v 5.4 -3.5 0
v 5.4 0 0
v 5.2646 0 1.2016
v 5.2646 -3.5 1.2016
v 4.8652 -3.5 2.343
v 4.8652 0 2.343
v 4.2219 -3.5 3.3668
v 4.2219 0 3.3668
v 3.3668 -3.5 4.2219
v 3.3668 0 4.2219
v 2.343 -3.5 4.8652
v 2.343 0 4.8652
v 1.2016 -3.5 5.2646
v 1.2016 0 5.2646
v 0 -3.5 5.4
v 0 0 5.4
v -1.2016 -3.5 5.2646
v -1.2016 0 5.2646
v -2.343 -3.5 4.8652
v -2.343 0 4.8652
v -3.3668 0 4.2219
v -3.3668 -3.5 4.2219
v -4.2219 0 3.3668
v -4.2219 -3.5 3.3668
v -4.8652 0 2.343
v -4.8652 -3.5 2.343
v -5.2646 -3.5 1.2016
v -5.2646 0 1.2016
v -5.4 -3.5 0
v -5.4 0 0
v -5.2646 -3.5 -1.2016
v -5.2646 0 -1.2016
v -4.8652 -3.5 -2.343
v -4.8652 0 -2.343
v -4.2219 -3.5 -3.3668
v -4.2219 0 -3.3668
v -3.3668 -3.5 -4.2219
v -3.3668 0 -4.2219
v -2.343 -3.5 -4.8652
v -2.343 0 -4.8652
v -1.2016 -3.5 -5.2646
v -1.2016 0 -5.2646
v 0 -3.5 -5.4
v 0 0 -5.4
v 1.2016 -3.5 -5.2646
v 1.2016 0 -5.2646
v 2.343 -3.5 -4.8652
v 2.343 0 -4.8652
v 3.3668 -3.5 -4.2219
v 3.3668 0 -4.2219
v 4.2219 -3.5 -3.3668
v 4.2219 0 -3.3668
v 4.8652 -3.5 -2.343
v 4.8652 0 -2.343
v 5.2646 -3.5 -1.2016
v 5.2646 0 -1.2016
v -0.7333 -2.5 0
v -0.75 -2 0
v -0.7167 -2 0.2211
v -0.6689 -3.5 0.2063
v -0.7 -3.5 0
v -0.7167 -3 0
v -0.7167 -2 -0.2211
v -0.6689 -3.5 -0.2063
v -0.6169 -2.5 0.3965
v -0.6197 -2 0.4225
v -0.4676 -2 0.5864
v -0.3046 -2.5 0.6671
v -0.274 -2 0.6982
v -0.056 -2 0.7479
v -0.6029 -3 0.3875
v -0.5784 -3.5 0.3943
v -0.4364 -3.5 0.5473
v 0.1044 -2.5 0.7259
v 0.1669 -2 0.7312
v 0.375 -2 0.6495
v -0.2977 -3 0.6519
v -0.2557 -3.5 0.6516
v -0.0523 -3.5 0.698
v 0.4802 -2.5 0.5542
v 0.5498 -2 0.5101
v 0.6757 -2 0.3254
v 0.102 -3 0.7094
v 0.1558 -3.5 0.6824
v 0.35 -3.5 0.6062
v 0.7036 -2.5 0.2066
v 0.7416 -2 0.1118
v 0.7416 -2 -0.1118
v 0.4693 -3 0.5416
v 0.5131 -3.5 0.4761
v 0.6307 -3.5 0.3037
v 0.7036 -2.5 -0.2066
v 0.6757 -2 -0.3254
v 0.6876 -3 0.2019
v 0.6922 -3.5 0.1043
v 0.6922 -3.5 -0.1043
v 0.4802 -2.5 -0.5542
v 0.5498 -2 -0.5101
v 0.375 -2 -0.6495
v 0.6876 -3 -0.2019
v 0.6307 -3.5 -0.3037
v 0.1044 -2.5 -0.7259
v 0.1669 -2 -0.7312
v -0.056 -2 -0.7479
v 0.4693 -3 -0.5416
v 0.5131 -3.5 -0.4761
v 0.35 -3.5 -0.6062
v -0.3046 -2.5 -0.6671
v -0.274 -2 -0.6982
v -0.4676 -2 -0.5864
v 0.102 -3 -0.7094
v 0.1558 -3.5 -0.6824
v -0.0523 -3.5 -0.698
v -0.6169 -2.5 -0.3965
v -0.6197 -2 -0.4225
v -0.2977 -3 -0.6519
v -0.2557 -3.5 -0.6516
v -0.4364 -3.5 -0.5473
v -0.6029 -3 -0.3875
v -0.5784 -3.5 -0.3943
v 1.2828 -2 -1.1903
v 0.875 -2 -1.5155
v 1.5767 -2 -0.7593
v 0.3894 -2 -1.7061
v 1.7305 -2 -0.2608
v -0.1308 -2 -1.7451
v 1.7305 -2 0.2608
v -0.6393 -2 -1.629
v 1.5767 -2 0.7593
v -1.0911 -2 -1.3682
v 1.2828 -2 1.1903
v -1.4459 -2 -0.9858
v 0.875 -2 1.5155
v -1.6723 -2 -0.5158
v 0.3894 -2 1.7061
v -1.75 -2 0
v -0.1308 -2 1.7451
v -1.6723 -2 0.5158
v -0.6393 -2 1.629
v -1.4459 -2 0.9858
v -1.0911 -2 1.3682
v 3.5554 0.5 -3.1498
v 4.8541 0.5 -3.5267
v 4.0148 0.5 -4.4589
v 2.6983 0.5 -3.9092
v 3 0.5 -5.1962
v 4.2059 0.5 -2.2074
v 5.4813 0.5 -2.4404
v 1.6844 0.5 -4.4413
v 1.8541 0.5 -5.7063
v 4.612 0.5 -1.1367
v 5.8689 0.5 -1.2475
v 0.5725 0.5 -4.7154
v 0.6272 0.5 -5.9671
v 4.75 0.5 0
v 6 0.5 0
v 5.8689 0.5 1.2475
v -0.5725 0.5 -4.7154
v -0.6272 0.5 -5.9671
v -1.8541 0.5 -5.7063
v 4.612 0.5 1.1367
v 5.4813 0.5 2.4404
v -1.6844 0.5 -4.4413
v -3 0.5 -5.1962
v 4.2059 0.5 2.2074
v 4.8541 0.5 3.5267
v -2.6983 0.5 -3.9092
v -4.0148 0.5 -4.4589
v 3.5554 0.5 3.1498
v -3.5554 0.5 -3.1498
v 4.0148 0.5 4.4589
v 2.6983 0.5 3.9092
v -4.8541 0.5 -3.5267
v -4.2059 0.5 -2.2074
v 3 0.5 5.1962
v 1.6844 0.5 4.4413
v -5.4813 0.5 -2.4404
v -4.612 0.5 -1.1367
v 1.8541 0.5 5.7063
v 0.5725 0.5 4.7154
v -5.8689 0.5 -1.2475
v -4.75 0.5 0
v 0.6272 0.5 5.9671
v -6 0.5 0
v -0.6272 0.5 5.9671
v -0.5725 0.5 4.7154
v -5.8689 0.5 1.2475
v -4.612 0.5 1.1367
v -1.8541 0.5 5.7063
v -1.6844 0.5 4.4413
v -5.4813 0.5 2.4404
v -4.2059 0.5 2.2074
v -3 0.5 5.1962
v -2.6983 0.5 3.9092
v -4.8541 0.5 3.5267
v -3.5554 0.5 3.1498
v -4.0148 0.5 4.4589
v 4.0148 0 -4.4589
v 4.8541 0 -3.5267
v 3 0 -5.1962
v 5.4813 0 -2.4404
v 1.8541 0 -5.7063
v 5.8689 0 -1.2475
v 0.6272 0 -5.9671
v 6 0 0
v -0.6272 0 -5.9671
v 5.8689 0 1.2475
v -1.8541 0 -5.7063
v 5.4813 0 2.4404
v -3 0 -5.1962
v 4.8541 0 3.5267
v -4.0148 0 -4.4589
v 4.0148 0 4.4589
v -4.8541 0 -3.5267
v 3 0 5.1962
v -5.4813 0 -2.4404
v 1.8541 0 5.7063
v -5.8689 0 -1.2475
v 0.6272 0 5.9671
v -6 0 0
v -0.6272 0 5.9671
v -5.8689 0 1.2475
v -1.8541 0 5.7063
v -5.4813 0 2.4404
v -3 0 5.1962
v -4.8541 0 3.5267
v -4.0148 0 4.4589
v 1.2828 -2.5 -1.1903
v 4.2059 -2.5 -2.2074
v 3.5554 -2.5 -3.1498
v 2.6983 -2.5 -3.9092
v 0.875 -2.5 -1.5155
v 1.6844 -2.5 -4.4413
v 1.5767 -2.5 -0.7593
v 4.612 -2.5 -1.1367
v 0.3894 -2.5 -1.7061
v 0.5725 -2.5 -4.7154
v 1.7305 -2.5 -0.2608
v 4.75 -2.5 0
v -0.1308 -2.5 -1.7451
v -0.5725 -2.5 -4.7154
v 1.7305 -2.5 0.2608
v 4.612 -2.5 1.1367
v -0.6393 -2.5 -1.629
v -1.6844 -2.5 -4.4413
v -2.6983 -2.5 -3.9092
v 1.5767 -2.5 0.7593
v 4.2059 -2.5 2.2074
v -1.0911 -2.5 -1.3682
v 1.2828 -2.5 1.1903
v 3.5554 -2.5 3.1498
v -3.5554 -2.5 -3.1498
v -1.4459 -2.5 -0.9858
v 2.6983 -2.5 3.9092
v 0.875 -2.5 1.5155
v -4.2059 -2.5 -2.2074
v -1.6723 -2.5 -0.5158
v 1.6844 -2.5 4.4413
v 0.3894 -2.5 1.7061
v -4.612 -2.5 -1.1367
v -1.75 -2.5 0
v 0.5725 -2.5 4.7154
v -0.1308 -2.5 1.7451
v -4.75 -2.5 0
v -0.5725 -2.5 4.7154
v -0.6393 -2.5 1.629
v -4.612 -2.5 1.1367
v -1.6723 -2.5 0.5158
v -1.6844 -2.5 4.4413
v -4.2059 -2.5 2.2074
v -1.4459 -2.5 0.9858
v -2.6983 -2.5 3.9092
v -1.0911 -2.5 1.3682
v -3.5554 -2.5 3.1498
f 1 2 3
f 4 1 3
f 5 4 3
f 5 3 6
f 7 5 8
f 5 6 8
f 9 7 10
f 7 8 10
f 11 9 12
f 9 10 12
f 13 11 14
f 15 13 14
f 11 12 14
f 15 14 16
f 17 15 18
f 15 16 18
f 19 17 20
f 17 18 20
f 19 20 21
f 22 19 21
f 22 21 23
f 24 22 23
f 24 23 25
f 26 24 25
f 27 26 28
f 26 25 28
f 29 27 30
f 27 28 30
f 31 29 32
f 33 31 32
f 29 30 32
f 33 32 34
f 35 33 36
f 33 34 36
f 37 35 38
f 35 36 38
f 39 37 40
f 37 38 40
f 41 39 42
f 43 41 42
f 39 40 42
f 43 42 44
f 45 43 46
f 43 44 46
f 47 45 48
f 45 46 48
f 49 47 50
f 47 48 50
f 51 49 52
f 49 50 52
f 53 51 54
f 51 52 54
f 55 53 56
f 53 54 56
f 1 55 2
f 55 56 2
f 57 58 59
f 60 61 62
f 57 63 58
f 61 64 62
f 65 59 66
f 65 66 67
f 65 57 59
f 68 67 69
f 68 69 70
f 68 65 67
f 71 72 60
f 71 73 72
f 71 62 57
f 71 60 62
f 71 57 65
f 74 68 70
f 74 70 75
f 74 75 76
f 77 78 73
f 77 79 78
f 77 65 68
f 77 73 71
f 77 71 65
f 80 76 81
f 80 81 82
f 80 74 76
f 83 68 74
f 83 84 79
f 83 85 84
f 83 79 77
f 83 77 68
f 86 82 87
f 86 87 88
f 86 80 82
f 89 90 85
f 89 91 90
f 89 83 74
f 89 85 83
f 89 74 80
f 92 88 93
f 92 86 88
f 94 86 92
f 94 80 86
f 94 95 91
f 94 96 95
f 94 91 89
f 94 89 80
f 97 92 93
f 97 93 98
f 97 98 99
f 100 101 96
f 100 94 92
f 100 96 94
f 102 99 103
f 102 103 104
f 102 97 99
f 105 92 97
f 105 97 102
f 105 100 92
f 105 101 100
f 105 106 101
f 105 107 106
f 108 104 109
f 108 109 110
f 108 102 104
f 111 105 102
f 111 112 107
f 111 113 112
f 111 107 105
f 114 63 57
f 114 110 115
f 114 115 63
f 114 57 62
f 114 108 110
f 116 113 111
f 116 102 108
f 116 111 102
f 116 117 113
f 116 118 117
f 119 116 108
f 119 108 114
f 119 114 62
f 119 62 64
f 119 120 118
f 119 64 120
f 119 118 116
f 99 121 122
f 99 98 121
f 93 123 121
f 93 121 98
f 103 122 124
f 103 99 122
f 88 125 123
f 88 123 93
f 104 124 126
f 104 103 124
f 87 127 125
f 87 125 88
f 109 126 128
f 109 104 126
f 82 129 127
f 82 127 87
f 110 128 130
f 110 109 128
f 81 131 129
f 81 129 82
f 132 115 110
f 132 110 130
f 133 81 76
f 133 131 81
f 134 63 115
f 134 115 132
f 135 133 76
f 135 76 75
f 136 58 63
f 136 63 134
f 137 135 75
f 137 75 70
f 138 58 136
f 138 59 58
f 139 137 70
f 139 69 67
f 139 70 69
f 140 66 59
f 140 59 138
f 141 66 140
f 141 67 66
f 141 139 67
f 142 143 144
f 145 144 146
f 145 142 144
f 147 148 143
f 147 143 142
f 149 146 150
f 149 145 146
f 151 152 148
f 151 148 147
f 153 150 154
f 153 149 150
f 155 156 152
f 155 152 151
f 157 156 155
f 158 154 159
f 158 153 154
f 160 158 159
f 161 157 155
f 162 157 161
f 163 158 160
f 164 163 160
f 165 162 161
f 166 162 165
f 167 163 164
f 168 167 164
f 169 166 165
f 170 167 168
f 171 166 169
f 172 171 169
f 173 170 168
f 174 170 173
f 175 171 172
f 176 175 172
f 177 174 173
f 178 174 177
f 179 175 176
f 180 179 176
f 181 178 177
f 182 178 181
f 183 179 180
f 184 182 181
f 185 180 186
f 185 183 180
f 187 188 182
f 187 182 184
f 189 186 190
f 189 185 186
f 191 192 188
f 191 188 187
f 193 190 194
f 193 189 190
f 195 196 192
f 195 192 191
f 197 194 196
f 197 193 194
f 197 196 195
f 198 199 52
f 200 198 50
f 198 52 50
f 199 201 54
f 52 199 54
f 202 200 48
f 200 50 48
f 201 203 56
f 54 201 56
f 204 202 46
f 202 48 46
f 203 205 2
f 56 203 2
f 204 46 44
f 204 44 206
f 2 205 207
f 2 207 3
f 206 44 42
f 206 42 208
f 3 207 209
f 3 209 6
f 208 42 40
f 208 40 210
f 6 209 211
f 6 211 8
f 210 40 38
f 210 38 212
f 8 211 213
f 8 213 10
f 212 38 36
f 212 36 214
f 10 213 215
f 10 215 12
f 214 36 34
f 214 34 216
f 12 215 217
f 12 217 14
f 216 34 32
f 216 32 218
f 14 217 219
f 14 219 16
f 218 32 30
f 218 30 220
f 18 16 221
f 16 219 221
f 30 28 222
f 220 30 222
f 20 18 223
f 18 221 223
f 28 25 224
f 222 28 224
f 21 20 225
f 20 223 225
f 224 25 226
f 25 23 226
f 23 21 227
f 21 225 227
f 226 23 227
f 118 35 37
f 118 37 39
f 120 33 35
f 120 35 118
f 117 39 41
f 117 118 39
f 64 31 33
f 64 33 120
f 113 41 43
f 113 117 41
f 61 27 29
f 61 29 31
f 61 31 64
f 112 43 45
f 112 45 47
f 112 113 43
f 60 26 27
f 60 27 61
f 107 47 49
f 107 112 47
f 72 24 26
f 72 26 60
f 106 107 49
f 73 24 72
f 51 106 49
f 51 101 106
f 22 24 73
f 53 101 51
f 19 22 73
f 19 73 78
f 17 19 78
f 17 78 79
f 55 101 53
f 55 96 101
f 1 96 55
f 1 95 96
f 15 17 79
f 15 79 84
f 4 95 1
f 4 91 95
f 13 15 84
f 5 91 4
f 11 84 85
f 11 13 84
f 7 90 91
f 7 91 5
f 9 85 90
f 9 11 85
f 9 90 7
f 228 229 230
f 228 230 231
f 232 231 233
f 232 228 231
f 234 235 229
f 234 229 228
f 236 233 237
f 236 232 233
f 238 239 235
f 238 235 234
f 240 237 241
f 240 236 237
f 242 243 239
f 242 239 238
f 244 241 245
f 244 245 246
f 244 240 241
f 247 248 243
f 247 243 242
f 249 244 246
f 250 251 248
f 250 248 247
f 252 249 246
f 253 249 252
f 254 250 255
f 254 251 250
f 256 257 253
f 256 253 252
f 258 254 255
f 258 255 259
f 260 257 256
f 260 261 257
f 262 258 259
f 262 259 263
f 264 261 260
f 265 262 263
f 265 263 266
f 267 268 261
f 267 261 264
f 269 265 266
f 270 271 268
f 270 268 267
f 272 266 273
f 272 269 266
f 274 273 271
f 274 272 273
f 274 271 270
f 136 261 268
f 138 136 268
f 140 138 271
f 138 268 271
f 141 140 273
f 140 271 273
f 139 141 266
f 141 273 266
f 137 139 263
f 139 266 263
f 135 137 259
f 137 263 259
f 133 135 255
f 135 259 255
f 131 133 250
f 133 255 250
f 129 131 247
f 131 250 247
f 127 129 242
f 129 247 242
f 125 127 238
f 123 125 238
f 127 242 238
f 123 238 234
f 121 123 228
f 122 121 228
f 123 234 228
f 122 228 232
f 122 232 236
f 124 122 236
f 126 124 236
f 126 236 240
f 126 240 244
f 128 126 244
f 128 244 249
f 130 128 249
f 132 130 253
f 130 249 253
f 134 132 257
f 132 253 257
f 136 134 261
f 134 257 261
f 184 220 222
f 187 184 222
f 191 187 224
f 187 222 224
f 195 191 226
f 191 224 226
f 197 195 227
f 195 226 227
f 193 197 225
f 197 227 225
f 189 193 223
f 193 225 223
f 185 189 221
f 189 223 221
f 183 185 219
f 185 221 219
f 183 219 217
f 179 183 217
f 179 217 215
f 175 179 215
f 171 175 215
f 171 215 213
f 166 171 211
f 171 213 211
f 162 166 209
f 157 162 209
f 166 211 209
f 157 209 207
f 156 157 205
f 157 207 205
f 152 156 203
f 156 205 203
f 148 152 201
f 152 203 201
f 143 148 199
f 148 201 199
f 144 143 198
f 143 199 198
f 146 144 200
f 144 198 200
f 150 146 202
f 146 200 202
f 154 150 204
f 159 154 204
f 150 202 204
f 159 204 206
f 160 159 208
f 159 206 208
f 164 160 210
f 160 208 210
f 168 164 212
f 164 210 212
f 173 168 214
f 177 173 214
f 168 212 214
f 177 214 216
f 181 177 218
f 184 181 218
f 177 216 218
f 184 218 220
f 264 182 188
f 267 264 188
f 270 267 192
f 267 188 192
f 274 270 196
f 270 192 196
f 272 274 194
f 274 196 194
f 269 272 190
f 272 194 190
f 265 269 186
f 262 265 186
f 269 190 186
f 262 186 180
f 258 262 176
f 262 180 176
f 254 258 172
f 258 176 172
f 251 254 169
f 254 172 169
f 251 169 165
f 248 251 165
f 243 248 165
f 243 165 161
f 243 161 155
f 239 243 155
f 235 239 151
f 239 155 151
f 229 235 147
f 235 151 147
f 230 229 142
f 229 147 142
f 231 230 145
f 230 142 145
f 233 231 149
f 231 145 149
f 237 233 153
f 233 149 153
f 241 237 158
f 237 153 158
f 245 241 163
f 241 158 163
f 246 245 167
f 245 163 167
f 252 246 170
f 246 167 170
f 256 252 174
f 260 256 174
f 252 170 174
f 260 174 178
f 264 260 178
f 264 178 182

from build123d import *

# Parameters (mm, degrees)
F0_R     = 5.4
F1_DEPTH = 3.5
F2_R     = 6
F2_R_2   = 5.4
F3_DEPTH = 0.5
F4_R     = 4.75
F5_DEPTH = 3
F7_R     = 1.75
F8_DEPTH = 0.5
F9_R     = 0.75
F6_R     = 0.7


with BuildPart() as f1:
    # F0 (on Front) → F1 (new body)
    with BuildSketch(Plane.XZ):
        Circle(F0_R)
    extrude(amount=F1_DEPTH)

    # F2 (on face) → F3 (join)
    with BuildSketch(Plane(origin=(0, 0, 0), x_dir=(-1, 0, 0), z_dir=(0, 1, 0))):
        Circle(F2_R)
        Circle(F2_R_2, mode=Mode.SUBTRACT)
        Circle(F2_R_2)
    extrude(amount=F3_DEPTH)

    # F4 (on face) → F5 (cut)
    with BuildSketch(Plane(origin=(0, 0.5, 0), x_dir=(-1, 0, 0), z_dir=(0, 1, 0))):
        Circle(F4_R)
    extrude(amount=-F5_DEPTH, mode=Mode.SUBTRACT)

    # F7 (on face) → F8 (join)
    with BuildSketch(Plane(origin=(0, -2.5, 0), x_dir=(-1, 0, 0), z_dir=(0, 1, 0))):
        Circle(F7_R)
    extrude(amount=F8_DEPTH)

    # F9 (on face) → F10 section 0
    with BuildSketch(Plane(origin=(0, -2, 0), x_dir=(-1, 0, 0), z_dir=(0, 1, 0))):
        Circle(F9_R)
    # F6 (on face) → F10 section 1
    with BuildSketch(Plane.XZ.offset(3.5)):
        Circle(F6_R)
    loft(mode=Mode.SUBTRACT)


solid = f1.part
